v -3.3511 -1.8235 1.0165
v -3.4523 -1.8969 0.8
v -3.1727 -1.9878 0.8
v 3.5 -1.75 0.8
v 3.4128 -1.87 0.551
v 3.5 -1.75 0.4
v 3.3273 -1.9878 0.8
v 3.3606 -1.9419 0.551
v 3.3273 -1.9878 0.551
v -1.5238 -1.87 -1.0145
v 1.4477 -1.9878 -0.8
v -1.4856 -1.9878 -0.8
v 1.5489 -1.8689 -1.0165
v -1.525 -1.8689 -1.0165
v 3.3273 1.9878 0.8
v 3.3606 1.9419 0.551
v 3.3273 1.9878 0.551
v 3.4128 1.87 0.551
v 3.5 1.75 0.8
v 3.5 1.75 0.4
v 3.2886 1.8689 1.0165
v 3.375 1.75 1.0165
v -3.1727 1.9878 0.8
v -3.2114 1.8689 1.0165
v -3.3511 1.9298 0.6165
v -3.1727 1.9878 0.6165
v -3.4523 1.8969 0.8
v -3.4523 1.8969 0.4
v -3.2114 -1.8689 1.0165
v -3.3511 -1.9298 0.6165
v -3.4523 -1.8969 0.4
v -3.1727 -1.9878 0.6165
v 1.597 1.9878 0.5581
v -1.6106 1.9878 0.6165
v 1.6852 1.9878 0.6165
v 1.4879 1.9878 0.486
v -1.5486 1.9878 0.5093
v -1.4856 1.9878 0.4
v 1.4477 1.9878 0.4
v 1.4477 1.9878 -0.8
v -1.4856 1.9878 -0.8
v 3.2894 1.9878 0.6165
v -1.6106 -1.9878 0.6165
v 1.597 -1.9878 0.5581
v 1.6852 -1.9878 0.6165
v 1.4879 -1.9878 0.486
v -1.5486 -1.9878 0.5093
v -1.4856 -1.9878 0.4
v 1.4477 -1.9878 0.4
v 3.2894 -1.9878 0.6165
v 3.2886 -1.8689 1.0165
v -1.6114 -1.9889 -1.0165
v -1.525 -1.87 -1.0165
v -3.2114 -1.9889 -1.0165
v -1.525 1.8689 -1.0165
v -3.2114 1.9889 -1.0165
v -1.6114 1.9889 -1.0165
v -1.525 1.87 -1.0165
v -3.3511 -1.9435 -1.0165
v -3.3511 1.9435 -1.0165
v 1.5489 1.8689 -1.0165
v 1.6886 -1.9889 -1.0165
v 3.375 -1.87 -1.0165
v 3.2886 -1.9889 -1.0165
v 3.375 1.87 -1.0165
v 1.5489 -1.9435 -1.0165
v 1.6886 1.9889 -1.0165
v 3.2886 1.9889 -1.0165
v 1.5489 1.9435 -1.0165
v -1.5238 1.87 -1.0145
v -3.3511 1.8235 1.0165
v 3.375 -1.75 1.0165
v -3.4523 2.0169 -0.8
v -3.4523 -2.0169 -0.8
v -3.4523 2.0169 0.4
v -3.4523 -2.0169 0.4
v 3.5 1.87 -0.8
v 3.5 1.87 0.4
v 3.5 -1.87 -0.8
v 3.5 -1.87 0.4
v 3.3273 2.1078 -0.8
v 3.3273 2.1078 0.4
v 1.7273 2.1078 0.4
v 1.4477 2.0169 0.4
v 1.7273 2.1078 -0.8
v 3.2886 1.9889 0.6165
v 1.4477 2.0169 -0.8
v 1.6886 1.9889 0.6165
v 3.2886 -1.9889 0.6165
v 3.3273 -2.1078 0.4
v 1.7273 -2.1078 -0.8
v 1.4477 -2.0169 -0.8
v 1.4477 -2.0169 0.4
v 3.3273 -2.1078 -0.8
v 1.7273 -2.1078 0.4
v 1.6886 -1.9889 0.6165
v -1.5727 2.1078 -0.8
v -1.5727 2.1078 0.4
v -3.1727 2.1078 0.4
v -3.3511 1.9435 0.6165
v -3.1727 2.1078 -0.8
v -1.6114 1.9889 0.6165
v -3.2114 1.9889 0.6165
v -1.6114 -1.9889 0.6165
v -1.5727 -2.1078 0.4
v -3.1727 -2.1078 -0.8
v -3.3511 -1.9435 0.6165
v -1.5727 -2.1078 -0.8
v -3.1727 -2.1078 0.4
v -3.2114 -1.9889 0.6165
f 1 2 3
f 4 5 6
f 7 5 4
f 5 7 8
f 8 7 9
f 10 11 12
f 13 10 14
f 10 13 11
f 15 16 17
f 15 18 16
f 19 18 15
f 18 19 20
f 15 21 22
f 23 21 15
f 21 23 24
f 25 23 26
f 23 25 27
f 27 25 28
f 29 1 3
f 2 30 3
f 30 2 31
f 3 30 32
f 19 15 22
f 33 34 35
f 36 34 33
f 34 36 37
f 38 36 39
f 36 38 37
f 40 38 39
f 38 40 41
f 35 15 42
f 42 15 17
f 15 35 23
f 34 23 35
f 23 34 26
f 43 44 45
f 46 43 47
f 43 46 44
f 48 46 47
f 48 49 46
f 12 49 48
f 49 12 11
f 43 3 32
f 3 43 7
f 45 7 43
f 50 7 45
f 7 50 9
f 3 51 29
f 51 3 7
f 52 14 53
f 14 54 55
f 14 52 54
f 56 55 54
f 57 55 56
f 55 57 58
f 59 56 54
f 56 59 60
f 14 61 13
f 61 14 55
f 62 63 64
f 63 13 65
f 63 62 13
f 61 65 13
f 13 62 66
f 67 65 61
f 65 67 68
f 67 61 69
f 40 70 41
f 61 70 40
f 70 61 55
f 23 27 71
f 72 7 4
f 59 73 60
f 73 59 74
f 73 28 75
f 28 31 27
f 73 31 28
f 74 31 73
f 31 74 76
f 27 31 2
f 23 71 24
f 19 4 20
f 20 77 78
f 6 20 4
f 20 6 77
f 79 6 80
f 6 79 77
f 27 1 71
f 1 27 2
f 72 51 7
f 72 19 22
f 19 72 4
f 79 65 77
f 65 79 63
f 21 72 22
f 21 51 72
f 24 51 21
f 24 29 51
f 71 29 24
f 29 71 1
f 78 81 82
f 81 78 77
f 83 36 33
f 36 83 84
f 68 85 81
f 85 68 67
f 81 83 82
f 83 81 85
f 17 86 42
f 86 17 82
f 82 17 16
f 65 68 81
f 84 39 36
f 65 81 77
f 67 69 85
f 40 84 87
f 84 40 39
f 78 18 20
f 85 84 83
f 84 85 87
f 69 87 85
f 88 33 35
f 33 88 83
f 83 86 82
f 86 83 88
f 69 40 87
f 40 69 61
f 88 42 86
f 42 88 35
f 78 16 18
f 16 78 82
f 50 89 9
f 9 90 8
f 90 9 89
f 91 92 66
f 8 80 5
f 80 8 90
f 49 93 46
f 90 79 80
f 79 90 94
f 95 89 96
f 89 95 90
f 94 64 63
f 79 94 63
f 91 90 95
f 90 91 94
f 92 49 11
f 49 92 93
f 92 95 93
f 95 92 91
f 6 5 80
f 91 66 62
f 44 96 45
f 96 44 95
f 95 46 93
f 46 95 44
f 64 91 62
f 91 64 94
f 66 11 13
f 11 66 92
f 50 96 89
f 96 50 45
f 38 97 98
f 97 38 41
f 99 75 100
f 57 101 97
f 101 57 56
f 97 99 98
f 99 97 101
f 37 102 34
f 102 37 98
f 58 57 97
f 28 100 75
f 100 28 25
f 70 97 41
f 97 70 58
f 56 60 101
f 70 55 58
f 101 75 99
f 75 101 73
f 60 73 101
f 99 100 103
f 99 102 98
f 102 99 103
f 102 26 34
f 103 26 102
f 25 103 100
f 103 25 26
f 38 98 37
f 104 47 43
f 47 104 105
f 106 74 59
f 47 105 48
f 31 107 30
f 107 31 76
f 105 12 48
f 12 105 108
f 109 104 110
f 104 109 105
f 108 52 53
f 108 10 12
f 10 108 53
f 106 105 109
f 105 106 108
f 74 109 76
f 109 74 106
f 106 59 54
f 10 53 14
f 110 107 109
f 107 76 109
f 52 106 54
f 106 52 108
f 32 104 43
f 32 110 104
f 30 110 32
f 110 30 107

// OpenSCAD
// Parameters
body_length = 6.5; //[3.25:13:0.1]
body_width = 3.5; //[1.75:7:0.1]
body_height = 1.6; //[0.8:3.2:0.05]
terminal_length = 0.8; //[0.4:1.6:0.05]
terminal_thickness = 0.12; //[0.05:0.3:0.01]
terminal_height = 1.2; //[0.6:1.6:0.05]
mark_length = 2.2; //[1.1:4.4:0.1]
mark_width = 1.2; //[0.6:2.4:0.1]
mark_thickness = 0.05; //[0.02:0.15:0.01]
fillet_radius = 0.25; //[0.1:0.6:0.05]
connect_overlap = 0.8; //[0.5:2:0.1]

// Main body
module main_body() {
  color([0.85, 0.85, 0.8]) // Off-white for SMD body
  cube([body_length, body_width, body_height], center=true);
}

// Terminal
module terminal() {
  color([0.72, 0.45, 0.2]) // Copper color for terminals
  cube([terminal_length + connect_overlap, body_width + 2*terminal_thickness, terminal_height], center=true);
}

// Top marking
module top_marking() {
  color([0.1, 0.1, 0.6]) // Blue for marking
  cube([mark_length, mark_width, mark_thickness], center=true);
}

// Edge fillet sphere
module edge_fillet_sphere() {
  sphere(r=fillet_radius, center=true);
}

// Assemble the component
module smd_component() {
  union() {
    // Main body
    main_body();
    
    // Terminals
    translate([-body_length/2 + (terminal_length + connect_overlap)/2, 0, -body_height/2 + terminal_height/2])
      terminal();
    translate([body_length/2 - (terminal_length + connect_overlap)/2, 0, -body_height/2 + terminal_height/2])
      terminal();
    
    // Top marking
    translate([0, 0, body_height/2 + mark_thickness/2 - connect_overlap/4])
      top_marking();
  }
}

// Final output with edge fillet
minkowski() {
  smd_component();
  edge_fillet_sphere();
}
